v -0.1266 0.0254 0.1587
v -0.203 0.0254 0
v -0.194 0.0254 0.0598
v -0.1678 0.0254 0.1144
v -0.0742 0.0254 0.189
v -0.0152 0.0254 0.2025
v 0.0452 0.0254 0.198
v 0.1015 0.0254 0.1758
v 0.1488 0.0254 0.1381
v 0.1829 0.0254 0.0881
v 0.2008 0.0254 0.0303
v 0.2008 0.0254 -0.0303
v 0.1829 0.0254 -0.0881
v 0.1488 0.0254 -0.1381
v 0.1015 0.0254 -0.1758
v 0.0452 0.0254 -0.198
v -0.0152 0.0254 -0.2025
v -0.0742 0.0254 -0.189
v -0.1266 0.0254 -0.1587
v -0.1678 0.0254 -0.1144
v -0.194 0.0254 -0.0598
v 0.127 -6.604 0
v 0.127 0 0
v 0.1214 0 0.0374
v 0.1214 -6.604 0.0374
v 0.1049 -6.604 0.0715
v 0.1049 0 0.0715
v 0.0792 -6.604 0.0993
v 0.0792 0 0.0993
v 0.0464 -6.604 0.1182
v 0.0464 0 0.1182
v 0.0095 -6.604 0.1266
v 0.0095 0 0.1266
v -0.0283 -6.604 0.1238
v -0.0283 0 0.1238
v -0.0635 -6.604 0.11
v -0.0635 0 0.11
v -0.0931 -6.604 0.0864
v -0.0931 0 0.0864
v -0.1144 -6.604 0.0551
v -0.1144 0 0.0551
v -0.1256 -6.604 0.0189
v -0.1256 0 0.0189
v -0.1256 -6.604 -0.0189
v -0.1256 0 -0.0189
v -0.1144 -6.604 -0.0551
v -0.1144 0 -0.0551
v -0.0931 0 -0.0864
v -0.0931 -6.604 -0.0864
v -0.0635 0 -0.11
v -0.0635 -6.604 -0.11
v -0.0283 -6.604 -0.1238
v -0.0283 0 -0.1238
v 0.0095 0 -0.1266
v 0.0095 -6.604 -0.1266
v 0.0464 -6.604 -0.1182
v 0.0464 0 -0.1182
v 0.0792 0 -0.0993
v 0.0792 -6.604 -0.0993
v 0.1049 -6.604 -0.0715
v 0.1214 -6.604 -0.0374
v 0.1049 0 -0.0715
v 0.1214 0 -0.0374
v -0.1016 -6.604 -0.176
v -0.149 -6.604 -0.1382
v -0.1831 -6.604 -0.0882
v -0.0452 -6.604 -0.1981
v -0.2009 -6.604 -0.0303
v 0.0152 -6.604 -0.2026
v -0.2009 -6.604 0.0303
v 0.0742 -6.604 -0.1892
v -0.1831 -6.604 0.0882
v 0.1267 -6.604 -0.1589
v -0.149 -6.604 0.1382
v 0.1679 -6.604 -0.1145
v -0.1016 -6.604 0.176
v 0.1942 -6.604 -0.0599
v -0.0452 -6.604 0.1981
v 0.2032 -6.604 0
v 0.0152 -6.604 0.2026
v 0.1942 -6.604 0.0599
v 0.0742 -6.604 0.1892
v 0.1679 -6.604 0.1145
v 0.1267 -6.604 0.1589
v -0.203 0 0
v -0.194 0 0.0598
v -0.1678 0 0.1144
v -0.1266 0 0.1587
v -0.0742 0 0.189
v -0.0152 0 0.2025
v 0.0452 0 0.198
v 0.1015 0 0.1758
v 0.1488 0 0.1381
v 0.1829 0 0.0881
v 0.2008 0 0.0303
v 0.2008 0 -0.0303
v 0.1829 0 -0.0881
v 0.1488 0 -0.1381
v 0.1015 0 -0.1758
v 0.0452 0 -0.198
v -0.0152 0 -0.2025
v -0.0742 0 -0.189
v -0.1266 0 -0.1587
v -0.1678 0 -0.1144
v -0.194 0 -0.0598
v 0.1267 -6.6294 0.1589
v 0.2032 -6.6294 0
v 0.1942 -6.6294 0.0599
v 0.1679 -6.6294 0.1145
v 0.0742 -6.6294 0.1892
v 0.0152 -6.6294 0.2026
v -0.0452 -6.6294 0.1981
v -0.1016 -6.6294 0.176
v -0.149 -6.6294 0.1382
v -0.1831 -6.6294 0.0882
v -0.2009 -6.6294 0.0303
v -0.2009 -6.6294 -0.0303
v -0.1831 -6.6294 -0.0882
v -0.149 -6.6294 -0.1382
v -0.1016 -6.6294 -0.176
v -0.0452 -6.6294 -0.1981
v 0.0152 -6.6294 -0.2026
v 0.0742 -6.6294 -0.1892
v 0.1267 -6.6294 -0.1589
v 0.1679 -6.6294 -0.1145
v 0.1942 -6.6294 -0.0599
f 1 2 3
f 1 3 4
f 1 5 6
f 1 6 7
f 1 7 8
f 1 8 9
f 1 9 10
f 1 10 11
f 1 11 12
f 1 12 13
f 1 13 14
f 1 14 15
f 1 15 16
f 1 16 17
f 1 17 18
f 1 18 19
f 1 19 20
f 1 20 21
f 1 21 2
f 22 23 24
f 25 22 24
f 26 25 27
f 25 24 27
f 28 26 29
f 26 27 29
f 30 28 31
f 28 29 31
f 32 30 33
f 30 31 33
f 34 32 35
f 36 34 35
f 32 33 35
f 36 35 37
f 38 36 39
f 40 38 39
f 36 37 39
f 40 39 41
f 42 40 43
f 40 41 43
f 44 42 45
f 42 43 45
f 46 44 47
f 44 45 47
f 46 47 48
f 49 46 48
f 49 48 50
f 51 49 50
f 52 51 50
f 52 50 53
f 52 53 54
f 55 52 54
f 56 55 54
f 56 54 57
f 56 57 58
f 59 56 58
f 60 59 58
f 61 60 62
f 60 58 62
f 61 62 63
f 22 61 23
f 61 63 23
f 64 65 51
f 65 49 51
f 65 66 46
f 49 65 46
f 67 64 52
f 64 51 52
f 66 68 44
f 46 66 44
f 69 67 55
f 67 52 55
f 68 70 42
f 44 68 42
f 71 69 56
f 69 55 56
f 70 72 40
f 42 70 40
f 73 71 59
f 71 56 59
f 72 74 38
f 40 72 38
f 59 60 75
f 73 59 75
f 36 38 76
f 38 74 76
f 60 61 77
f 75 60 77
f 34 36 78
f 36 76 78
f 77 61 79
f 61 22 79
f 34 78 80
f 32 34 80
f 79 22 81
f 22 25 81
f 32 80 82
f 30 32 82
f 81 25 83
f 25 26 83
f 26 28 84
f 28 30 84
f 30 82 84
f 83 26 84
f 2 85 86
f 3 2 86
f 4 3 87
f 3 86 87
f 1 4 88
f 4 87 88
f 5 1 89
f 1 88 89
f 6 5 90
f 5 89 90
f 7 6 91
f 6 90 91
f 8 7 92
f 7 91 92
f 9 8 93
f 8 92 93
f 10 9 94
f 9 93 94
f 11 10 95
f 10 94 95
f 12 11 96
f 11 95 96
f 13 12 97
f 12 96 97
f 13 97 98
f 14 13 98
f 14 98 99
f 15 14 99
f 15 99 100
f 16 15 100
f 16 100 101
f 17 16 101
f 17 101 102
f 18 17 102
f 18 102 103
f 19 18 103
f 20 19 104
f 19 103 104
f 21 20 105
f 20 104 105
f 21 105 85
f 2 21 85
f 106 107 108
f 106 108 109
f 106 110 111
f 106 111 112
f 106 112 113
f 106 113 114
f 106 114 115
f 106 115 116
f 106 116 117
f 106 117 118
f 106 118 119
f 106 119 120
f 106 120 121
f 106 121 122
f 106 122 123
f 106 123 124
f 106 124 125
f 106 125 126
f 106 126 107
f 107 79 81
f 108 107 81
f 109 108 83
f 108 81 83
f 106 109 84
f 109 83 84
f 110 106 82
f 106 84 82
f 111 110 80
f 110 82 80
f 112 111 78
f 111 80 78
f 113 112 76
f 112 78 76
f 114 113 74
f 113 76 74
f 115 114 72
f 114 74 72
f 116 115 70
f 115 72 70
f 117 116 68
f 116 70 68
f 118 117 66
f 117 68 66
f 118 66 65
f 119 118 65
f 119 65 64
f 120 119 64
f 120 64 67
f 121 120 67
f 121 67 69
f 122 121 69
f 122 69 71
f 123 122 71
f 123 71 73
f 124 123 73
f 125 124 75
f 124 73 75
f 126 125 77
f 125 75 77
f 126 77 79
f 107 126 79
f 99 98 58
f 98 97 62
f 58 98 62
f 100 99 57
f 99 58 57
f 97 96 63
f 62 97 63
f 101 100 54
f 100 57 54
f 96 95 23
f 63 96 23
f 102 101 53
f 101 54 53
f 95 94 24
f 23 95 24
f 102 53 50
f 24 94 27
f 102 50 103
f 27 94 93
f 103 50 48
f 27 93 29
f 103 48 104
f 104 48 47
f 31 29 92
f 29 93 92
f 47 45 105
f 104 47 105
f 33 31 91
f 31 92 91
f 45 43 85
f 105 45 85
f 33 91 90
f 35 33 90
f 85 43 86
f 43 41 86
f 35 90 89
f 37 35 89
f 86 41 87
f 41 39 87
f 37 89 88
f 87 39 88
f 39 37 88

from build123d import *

# Parameters (mm, degrees)
F0_R     = 0.127
F1_DEPTH = 6.604
F2_R     = 0.2032
F2_R_2   = 0.127
F3_DEPTH = 0.0254
F4_R     = 0.2030483618
F4_R_2   = 0.127
F5_DEPTH = 0.0254


with BuildPart() as f1:
    # F0 (on Front) → F1 (new body)
    with BuildSketch(Plane.XZ):
        Circle(F0_R)
    extrude(amount=F1_DEPTH)

    # F2 (on face) → F3 (join)
    with BuildSketch(Plane.XZ.offset(6.604)):
        Circle(F2_R)
        Circle(F2_R_2, mode=Mode.SUBTRACT)
        Circle(F2_R_2)
    extrude(amount=F3_DEPTH)

    # F4 (on face) → F5 (join)
    with BuildSketch(Plane(origin=(0, 0, 0), x_dir=(-1, 0, 0), z_dir=(0, 1, 0))):
        Circle(F4_R)
        Circle(F4_R_2, mode=Mode.SUBTRACT)
        Circle(F4_R_2)
    extrude(amount=F5_DEPTH)


solid = f1.part
